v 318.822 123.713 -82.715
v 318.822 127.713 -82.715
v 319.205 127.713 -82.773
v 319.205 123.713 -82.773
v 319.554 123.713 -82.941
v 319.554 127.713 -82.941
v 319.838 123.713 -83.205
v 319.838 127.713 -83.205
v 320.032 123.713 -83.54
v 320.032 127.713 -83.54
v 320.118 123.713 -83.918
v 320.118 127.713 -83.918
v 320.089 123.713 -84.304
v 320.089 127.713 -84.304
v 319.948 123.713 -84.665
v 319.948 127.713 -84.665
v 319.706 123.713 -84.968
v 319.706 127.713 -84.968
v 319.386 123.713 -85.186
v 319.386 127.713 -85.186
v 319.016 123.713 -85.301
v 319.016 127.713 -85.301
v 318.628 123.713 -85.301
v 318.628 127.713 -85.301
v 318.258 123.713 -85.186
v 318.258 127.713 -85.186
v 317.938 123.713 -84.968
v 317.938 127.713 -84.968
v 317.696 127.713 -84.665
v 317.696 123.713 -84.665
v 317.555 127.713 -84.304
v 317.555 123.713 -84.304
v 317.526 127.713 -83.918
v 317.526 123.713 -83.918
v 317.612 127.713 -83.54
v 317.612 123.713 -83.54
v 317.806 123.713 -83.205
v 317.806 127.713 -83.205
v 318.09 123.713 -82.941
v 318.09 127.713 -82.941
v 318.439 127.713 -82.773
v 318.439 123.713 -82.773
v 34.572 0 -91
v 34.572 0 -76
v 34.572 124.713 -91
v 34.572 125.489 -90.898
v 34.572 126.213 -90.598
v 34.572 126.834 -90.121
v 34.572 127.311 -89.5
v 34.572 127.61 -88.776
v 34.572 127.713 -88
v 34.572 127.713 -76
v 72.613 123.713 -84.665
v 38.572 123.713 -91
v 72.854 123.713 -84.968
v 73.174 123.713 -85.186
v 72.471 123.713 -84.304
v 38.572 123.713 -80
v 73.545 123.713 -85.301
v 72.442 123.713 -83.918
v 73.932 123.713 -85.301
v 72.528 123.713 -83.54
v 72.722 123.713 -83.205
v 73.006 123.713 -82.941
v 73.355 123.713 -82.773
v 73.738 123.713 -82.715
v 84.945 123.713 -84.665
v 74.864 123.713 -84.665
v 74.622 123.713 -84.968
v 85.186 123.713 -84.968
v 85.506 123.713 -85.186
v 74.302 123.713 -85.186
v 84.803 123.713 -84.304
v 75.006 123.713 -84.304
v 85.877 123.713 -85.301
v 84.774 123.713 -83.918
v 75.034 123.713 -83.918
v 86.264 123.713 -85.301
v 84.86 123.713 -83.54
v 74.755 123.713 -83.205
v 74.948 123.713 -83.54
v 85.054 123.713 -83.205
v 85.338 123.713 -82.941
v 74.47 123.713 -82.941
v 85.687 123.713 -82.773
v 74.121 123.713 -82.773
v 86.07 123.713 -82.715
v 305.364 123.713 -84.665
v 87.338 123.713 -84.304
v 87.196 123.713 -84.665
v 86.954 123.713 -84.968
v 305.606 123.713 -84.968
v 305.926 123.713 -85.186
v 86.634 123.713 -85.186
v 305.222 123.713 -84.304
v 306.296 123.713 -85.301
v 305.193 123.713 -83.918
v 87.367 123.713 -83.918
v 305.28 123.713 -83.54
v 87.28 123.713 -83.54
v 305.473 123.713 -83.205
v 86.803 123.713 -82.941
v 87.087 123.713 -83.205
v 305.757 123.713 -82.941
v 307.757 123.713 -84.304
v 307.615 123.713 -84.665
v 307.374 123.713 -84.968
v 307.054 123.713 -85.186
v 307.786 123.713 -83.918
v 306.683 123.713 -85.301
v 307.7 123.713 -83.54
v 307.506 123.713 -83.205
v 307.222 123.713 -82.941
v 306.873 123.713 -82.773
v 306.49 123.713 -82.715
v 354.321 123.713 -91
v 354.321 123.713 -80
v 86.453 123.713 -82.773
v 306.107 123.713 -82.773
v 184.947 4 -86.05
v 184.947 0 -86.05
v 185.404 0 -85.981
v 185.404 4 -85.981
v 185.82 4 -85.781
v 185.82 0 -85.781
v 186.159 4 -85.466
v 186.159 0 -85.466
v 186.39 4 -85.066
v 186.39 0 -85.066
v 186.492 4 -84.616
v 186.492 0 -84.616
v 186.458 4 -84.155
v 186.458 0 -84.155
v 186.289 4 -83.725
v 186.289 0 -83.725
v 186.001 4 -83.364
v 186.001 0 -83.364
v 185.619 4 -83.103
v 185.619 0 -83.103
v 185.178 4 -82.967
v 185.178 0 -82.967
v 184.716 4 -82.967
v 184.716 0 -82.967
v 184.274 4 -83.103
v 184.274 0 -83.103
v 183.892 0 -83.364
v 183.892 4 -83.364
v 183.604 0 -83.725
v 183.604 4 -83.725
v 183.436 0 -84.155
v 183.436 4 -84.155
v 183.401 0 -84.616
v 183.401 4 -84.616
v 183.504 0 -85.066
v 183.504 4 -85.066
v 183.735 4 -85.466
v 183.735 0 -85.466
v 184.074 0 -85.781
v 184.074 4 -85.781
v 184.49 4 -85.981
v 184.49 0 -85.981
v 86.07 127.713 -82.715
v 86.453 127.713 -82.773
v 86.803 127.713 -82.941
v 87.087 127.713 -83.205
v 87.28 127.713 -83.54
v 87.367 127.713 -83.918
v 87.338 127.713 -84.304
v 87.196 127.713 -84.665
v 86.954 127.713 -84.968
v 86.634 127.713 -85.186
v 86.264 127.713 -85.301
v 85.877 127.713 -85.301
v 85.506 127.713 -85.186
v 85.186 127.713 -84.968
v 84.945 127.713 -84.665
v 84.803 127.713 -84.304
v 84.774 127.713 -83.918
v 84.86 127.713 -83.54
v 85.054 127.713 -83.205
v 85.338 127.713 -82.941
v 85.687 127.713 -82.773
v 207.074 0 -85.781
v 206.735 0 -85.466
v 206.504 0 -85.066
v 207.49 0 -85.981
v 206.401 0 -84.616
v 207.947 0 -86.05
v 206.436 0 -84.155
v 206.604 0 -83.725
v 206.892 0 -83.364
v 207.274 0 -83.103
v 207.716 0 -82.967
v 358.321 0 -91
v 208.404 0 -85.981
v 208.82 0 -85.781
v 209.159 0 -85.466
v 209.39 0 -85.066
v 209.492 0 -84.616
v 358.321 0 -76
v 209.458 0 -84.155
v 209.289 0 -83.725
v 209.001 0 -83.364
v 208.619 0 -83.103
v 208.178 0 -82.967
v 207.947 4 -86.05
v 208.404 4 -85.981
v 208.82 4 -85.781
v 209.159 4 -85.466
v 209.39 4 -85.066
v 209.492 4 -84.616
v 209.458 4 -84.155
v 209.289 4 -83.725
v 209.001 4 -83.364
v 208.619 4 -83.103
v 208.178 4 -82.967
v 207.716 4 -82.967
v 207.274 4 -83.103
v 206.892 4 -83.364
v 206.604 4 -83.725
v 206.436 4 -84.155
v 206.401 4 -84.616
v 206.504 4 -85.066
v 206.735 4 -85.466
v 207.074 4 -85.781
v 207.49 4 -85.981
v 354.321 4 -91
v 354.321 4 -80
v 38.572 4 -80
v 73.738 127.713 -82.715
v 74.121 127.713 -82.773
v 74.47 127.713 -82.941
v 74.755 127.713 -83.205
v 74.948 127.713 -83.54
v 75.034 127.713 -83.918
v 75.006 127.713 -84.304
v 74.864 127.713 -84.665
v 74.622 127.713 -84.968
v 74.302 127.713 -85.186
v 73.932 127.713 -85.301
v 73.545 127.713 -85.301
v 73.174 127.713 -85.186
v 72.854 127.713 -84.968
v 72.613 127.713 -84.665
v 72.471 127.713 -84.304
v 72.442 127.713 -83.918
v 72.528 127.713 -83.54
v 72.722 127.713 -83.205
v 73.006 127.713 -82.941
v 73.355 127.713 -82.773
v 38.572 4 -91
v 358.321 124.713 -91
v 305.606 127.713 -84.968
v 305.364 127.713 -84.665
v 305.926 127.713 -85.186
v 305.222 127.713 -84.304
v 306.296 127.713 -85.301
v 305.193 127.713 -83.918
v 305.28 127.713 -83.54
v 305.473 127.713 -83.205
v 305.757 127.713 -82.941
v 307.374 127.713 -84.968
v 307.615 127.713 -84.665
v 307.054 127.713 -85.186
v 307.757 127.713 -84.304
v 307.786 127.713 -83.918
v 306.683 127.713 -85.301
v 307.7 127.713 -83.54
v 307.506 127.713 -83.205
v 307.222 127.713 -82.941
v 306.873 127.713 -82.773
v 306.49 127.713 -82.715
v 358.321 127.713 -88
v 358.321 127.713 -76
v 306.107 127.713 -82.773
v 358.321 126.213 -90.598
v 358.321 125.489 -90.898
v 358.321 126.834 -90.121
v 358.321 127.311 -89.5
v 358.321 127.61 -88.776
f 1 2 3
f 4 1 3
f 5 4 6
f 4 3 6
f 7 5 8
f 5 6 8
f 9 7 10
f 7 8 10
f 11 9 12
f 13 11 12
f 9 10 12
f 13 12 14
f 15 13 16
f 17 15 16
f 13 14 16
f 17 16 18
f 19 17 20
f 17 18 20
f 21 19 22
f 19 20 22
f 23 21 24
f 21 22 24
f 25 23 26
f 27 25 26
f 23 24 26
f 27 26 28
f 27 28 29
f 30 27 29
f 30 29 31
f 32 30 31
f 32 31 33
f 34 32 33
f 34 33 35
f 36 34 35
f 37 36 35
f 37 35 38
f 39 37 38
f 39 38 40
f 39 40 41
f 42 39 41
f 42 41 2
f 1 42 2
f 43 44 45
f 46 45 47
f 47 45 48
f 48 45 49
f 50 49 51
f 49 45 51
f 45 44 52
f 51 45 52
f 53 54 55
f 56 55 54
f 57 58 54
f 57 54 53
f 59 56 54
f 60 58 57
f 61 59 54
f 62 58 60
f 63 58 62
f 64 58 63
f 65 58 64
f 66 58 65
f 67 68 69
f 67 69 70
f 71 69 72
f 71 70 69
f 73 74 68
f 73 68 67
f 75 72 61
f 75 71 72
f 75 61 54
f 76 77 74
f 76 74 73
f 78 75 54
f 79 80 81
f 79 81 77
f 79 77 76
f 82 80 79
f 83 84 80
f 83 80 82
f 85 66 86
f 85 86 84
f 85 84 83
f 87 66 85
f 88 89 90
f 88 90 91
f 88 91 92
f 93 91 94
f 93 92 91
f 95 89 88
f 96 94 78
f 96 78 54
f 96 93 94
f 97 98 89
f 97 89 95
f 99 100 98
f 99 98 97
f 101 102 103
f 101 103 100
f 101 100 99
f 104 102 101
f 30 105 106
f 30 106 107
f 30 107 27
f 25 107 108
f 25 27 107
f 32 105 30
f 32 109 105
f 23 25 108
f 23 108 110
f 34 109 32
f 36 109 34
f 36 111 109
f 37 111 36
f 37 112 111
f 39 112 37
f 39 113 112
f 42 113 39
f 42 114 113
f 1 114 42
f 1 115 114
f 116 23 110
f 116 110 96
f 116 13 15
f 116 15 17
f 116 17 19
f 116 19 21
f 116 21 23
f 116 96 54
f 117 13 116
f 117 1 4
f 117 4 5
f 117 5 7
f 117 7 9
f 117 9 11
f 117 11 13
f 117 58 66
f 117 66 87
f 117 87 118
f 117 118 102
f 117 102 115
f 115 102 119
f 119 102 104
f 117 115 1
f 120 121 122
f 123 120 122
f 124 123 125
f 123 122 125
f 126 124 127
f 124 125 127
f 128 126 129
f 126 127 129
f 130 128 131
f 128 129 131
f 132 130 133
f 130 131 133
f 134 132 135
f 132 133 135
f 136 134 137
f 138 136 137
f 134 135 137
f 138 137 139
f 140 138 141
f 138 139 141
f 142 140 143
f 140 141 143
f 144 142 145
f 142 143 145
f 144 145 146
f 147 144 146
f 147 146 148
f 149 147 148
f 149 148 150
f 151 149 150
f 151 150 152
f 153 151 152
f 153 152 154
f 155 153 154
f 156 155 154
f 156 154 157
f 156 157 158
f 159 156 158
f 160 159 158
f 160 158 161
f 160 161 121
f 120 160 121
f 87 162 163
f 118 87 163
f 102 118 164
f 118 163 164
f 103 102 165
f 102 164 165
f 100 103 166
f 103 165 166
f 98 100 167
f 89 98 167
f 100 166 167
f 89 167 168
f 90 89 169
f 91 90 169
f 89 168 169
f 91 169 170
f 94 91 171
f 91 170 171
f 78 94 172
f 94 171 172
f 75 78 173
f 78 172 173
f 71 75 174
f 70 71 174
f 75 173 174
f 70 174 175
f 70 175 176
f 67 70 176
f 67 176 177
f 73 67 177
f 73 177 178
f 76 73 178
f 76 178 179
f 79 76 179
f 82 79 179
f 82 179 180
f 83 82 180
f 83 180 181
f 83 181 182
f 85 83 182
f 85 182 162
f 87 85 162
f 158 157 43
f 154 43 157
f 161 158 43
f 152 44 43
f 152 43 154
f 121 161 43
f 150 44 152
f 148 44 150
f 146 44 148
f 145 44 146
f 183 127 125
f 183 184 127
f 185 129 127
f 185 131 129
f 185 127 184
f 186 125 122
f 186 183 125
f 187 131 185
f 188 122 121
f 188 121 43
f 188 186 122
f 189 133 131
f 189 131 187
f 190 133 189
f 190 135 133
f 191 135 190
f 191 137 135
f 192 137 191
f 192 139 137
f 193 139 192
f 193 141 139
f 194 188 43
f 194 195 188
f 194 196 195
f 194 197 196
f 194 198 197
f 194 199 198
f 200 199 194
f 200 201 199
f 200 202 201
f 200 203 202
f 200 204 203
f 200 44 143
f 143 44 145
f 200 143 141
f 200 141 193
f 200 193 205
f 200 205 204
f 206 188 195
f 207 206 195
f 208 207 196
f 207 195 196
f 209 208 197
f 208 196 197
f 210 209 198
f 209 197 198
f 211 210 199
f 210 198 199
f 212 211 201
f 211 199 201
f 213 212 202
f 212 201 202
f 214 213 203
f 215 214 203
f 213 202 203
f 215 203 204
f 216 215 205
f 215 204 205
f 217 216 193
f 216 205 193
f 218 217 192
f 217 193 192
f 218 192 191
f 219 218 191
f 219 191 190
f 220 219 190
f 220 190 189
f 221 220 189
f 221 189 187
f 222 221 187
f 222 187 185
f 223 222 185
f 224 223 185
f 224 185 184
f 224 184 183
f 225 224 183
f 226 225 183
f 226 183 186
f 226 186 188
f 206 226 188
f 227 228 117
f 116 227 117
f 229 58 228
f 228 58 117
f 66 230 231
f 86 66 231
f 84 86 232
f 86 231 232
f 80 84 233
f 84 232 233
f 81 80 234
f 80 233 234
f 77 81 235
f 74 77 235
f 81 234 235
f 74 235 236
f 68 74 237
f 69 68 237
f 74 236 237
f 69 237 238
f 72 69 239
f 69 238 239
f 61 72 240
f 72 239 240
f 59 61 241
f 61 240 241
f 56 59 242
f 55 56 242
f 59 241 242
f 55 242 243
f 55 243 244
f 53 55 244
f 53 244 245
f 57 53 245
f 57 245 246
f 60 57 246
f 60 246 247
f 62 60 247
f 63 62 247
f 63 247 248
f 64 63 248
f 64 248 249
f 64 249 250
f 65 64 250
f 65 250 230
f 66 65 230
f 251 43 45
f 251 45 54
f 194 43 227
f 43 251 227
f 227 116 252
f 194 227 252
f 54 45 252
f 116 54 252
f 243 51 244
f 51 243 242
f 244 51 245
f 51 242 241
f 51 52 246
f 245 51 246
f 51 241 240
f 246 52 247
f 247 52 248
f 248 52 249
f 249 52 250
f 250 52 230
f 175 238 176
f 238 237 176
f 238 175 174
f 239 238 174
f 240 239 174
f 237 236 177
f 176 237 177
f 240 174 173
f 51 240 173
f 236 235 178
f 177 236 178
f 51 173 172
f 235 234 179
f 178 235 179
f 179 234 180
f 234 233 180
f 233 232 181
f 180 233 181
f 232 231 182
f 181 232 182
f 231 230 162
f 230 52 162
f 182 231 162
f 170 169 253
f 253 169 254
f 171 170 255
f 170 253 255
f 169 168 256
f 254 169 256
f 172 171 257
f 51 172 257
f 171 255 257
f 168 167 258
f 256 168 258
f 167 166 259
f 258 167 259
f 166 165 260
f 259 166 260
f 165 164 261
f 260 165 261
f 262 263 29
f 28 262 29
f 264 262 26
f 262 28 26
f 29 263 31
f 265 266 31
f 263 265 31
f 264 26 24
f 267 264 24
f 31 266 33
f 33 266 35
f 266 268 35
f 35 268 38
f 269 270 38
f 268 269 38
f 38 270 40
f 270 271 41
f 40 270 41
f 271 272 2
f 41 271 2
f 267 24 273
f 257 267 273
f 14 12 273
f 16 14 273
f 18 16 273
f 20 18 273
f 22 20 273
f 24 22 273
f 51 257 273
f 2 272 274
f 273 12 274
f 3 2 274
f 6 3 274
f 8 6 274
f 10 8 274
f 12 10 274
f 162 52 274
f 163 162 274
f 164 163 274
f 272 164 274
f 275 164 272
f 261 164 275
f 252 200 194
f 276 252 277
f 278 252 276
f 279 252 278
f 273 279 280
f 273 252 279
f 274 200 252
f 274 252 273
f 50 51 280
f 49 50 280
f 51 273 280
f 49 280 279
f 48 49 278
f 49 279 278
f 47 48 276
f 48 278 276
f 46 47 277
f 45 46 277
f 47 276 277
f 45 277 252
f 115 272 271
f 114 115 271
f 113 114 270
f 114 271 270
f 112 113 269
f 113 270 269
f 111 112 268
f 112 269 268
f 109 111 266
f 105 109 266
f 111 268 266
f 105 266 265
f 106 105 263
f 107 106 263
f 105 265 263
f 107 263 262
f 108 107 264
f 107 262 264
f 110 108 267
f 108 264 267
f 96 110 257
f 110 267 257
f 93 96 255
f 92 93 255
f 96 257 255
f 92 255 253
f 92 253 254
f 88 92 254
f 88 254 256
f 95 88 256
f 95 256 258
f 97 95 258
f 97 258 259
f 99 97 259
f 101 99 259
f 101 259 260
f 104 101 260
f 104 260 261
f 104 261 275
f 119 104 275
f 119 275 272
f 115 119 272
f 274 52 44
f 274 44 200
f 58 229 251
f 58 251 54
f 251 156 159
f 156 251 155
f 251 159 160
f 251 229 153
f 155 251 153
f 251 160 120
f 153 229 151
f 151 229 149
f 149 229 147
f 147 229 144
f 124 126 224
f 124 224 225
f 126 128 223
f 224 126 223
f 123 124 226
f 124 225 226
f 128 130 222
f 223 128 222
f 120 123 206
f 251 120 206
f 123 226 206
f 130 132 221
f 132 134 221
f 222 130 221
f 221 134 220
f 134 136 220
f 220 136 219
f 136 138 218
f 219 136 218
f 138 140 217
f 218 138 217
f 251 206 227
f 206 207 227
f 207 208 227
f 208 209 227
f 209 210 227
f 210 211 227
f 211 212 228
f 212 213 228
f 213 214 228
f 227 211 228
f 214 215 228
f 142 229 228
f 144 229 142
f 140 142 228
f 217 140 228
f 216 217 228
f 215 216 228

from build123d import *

# Parameters (mm, degrees)
BOSS_EXTRUDE1_START = -80
SKETCH1_W           = 323.749339931
SKETCH1_H           = 127.712624425
BOSS_EXTRUDE1_DEPTH = 4
SKETCH4_W           = 323.749339931
SKETCH4_H           = 127.712624425
SKETCH4_W_2         = 315.749339931
SKETCH4_H_2         = 119.712624425
BOSS_EXTRUDE2_DEPTH = 15
SKETCH6_R           = 1.55
CUT_EXTRUDE2_DEPTH  = 6
SKETCH10_R          = 1.29987
CUT_EXTRUDE3_DEPTH  = 6
FILLET1_R           = 3


with BuildPart() as part:
    # Sketch1 → Boss-Extrude1 (new body)
    with BuildSketch(Plane.XY.offset(BOSS_EXTRUDE1_START)):
        with Locations((196.446669966, 63.856312213)):
            Rectangle(SKETCH1_W, SKETCH1_H)
    extrude(amount=BOSS_EXTRUDE1_DEPTH)

    # Sketch4 → Boss-Extrude2 (add)
    with BuildSketch(Plane.XY.offset(-76)):
        with Locations((196.446669966, 63.856312213)):
            Rectangle(SKETCH4_W, SKETCH4_H)
        with Locations((196.446669966, 63.856312213)):
            Rectangle(SKETCH4_W_2, SKETCH4_H_2, mode=Mode.SUBTRACT)
    extrude(amount=-BOSS_EXTRUDE2_DEPTH)

    # Sketch6 → Cut-Extrude2 (cut)
    with BuildSketch(Plane.XZ):
        with Locations(Location((207.946669965, -84.5, 0), (0, 0, 270))):
            Circle(SKETCH6_R)
        with Locations(Location((184.946669965, -84.5, 0), (0, 0, 270))):
            Circle(SKETCH6_R)
    extrude(amount=-CUT_EXTRUDE2_DEPTH, mode=Mode.SUBTRACT)

    # Sketch10 → Cut-Extrude3 (cut)
    with BuildSketch(Plane(origin=(0, 127.712624425, 0), x_dir=(1, 0, 0), z_dir=(0, 1, 0))):
        with Locations(Location((306.489689931, 84.015230538, 0), (0, 0, 270))):
            Circle(SKETCH10_R)
        with Locations(Location((318.821789931, 84.015230538, 0), (0, 0, 270))):
            Circle(SKETCH10_R)
        with Locations(Location((73.73825, 84.015230538, 0), (0, 0, 270))):
            Circle(SKETCH10_R)
        with Locations(Location((86.07035, 84.015230538, 0), (0, 0, 270))):
            Circle(SKETCH10_R)
    extrude(amount=-CUT_EXTRUDE3_DEPTH, mode=Mode.SUBTRACT)

    # Fillet1
    fillet1_edges = [part.edges().sort_by_distance(p)[0] for p in [
        (196.446669965, 127.712624425, -91),
    ]]
    fillet(fillet1_edges, radius=FILLET1_R)


solid = part.part
